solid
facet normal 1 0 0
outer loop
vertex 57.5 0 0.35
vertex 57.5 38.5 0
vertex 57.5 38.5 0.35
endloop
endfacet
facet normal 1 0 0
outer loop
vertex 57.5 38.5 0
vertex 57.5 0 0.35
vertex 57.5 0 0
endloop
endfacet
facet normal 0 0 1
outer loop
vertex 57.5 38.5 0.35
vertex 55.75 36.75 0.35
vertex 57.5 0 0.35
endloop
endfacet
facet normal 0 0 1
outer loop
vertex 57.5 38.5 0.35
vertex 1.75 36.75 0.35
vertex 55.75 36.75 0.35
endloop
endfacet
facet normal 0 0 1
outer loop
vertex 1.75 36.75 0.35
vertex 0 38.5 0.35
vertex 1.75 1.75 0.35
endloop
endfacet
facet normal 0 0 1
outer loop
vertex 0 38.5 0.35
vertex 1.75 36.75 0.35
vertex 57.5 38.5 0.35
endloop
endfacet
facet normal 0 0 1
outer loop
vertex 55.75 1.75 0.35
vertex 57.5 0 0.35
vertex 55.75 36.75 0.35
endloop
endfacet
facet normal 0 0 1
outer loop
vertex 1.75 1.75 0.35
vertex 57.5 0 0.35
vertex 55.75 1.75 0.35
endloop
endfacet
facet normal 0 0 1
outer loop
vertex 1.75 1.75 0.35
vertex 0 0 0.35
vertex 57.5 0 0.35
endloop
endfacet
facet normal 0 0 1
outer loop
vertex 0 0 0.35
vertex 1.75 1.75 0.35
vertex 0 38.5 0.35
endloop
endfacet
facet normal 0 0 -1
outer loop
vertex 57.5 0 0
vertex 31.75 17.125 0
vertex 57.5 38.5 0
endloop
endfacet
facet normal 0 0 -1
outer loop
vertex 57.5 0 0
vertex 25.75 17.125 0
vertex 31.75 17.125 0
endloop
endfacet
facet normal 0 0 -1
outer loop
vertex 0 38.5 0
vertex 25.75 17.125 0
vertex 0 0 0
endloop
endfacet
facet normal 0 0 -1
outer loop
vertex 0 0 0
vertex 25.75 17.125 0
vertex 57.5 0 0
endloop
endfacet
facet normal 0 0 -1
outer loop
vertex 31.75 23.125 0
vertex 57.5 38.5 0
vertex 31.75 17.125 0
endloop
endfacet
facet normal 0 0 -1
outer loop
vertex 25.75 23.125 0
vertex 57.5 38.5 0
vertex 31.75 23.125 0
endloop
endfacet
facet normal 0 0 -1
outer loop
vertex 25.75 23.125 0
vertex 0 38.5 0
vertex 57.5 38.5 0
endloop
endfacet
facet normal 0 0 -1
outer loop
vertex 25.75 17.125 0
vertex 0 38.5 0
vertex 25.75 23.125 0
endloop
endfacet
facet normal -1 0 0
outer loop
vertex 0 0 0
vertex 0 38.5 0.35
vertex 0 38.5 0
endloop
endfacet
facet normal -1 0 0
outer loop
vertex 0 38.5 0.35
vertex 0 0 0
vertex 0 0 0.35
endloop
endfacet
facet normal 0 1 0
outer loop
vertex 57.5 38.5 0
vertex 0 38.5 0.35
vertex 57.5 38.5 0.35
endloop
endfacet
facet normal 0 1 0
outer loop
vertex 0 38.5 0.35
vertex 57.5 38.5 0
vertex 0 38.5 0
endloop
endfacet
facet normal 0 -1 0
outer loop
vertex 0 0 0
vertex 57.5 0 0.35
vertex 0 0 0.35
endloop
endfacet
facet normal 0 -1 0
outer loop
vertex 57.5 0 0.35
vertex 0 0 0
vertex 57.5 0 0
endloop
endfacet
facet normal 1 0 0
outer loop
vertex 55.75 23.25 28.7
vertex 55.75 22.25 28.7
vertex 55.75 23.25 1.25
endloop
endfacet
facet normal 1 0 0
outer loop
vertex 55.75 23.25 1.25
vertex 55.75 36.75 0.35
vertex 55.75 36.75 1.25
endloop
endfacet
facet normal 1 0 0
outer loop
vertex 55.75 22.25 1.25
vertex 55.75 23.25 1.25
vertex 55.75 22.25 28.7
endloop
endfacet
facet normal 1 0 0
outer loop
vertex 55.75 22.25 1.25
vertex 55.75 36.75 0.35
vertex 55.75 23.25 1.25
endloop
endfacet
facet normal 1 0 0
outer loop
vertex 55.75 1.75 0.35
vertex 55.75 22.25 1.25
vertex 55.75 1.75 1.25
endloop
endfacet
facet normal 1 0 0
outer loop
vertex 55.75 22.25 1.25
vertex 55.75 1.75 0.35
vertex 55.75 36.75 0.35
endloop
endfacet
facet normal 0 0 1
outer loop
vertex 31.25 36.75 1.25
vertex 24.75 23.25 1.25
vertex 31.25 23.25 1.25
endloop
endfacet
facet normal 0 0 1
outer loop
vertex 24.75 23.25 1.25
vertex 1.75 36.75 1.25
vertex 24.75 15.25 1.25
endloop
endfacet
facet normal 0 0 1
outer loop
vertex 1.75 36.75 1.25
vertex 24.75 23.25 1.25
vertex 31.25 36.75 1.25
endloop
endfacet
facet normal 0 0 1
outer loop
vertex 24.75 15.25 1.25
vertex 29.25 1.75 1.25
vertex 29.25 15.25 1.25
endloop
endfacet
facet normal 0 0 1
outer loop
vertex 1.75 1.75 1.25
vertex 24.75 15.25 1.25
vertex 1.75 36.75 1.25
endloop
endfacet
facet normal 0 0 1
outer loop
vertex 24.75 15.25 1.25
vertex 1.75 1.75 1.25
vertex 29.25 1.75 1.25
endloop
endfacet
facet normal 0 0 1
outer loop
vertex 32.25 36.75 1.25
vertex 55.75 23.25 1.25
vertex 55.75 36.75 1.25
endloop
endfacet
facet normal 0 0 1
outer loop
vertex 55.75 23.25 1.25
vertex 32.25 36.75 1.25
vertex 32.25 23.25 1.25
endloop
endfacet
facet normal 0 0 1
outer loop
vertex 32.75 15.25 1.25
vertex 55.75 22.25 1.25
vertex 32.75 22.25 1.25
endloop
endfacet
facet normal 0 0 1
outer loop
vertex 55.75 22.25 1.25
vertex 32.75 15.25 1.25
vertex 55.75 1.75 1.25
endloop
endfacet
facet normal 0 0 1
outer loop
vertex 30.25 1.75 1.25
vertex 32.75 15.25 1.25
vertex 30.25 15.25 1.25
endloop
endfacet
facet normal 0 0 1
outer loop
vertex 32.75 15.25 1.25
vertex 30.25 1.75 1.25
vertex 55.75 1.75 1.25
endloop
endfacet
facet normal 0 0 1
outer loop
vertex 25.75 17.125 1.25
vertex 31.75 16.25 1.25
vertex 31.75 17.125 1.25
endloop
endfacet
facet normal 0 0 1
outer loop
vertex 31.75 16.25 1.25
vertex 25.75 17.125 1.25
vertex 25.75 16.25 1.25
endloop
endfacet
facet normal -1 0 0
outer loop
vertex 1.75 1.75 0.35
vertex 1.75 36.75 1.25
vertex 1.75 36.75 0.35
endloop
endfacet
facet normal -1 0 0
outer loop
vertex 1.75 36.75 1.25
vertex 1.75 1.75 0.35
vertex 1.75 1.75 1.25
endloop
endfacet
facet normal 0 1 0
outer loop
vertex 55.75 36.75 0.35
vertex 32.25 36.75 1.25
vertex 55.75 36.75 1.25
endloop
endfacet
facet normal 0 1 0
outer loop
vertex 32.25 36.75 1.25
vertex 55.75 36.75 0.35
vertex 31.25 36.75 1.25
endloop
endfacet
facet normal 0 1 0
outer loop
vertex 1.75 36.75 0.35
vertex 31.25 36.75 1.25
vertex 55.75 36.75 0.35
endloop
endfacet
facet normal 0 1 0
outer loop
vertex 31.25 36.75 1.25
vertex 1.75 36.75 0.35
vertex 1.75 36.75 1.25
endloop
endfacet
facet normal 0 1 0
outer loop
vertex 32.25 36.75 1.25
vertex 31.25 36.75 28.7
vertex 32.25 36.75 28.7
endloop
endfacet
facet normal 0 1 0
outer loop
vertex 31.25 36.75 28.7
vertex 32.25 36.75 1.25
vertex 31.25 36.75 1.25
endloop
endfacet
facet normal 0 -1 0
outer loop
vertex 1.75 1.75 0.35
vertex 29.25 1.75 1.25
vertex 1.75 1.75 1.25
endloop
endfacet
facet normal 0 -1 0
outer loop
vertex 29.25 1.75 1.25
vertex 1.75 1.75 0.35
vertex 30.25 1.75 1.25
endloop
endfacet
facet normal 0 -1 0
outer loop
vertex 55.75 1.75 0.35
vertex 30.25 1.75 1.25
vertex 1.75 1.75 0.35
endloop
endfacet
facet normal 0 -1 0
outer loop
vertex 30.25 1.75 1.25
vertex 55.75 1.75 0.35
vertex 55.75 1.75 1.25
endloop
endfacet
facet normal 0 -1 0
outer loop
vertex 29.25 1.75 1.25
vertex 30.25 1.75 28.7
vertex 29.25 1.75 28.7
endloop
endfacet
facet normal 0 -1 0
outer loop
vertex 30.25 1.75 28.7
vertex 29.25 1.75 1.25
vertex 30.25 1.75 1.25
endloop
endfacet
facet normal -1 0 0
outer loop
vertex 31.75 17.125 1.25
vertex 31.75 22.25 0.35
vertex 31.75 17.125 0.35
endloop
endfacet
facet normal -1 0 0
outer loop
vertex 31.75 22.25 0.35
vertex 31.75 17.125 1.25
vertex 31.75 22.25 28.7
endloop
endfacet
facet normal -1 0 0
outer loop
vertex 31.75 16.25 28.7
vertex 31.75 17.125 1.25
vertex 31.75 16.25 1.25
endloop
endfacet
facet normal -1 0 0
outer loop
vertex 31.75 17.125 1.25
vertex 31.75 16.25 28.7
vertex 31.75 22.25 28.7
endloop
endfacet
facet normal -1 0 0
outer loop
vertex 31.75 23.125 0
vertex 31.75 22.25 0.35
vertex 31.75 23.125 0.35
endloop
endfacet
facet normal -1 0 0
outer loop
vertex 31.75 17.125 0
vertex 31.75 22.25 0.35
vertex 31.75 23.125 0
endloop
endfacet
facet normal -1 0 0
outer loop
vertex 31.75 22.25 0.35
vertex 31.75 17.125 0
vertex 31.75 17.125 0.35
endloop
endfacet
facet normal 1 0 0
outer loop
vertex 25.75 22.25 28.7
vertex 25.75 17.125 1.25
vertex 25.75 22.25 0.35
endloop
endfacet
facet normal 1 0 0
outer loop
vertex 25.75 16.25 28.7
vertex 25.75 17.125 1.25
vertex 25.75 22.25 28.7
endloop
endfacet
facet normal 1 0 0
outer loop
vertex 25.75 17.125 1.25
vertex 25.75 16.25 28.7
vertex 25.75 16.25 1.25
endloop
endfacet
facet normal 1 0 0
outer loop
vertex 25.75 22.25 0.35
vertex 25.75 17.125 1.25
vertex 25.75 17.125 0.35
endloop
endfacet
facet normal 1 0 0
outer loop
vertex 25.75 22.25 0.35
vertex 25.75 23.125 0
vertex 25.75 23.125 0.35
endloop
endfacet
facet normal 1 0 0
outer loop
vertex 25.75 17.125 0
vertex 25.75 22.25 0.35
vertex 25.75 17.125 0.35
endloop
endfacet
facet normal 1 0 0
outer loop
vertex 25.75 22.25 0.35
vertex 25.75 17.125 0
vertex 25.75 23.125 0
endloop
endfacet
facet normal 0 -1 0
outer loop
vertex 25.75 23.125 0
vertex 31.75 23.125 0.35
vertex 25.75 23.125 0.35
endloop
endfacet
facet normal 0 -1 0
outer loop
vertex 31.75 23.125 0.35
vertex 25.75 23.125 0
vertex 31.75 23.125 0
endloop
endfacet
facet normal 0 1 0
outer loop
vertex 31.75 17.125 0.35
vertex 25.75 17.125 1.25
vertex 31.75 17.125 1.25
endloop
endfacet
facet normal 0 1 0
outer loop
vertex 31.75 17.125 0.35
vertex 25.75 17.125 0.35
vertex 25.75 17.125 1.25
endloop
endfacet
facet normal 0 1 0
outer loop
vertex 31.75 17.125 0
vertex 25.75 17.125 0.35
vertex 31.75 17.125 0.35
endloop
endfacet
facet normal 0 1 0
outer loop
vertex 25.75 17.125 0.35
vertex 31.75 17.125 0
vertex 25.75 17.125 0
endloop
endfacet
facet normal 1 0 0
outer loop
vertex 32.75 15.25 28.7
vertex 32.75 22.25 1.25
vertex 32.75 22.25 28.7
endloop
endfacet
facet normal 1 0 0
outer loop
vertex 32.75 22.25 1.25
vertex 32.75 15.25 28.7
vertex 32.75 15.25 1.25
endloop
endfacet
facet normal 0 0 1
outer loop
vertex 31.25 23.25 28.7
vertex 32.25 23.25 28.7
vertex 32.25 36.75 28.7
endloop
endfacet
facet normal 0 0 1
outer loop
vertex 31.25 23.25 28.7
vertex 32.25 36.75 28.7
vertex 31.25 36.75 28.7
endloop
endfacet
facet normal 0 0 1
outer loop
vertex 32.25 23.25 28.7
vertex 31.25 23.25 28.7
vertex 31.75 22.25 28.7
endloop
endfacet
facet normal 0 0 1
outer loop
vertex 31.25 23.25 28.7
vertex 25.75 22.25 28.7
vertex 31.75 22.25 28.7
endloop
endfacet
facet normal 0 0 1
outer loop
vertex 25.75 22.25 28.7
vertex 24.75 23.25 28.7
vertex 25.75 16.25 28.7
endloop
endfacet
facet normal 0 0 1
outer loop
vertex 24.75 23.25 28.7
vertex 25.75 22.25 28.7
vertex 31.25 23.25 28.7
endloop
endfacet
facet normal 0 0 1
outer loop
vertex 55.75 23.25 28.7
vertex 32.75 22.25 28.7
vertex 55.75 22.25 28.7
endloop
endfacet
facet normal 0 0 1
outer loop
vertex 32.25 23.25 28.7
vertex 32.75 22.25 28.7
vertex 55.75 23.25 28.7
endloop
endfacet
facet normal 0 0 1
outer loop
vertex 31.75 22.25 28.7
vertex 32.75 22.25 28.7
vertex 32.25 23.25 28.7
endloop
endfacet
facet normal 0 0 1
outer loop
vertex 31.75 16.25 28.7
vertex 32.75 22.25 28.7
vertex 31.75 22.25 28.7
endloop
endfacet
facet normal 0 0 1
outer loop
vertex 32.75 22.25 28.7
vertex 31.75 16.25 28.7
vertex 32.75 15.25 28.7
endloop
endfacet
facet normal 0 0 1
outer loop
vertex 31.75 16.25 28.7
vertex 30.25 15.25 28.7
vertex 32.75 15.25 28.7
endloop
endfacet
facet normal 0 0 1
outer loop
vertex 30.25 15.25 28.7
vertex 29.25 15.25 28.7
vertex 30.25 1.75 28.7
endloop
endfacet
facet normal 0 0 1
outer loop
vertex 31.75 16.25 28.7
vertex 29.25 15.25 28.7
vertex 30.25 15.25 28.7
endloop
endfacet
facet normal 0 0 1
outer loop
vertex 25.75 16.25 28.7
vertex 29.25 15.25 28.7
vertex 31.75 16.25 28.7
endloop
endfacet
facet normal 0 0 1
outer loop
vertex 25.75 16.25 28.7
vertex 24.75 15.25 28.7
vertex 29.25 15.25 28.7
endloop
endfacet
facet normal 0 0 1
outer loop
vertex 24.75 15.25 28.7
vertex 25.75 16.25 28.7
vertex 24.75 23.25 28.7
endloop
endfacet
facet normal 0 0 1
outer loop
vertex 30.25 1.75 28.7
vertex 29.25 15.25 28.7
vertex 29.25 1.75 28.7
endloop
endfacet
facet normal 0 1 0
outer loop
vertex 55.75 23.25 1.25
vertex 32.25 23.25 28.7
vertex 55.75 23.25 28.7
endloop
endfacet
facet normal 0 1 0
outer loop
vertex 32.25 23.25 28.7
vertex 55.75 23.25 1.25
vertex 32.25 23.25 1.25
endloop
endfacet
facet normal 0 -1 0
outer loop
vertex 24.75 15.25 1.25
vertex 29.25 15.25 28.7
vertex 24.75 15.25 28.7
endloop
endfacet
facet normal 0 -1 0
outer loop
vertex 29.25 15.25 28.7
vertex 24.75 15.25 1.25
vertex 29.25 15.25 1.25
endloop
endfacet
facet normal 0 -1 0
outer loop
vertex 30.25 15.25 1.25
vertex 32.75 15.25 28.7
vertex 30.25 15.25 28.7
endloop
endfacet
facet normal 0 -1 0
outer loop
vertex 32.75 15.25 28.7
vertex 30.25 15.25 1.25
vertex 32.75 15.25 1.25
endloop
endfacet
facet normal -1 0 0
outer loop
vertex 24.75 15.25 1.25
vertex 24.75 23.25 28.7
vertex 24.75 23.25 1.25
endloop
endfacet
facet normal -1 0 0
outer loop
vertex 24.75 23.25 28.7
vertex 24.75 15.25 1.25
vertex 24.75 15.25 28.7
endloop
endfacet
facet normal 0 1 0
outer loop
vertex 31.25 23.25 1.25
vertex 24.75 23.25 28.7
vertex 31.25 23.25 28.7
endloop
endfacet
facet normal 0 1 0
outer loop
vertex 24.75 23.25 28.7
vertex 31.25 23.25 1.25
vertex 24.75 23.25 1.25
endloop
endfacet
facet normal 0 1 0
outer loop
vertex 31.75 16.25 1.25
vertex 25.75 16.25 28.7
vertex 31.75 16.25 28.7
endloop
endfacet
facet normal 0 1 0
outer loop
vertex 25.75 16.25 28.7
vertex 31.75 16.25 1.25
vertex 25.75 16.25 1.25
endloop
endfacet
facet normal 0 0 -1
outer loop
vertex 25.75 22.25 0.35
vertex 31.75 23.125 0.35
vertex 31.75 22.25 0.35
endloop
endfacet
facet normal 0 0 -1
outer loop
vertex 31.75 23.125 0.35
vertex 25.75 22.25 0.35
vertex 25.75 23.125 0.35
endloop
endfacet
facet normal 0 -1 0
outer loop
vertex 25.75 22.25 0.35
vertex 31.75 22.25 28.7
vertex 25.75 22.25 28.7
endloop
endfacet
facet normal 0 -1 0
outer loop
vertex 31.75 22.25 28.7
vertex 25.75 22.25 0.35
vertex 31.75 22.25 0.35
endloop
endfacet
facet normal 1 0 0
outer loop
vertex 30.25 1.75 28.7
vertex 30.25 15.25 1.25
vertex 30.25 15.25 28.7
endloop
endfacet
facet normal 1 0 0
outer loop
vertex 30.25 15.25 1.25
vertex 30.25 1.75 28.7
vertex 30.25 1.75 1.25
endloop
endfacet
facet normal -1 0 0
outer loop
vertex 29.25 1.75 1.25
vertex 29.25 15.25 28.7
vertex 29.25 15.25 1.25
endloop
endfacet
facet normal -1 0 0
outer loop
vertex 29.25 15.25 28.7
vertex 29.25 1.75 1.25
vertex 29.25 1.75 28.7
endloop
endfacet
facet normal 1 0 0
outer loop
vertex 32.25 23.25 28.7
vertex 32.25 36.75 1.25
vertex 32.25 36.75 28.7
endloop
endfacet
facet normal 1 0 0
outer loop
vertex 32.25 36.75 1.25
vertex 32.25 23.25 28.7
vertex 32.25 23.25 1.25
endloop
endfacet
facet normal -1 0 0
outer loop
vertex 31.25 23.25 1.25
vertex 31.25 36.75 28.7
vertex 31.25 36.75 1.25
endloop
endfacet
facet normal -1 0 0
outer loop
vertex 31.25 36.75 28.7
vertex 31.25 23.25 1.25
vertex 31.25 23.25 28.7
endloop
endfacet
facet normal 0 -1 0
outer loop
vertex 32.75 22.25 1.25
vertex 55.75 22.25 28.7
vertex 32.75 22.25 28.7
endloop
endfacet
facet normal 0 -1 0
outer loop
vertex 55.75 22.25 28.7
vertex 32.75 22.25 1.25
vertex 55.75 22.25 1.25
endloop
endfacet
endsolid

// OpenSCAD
/*
Projekt Name: Trennwaende für das Modellhaus 3723
Modul:  Grundplatte und Waende für das Erdgeschoss
Projekt URL: https://github.com/Hardi-St/MobaLedLib_Docu/tree/master/3D_Daten_fuer_die_MobaLedLib/Trennwände%20für%20Häuser
Version: 0.0.1
Autor: Moba-Nick (mobanick@wp12085804.server-he.de)
Lizenz: CC-BY-SA-4.0 (https://creativecommons.org/licenses/by-sa/4.0/legalcode.de)
*/
// Alle Angaben sind immer in mm bei meinen Projekten.
//Parameter für die Grundplatte des Hauses
x_grund = 54;       // Laenge der Grundplatte
y_grund = 35;       // Breite der Grundplatte 
z_grund = 1.25;       // Staerke der Grundplatte
z_erdgeschoss = 28; // Hoehe des Erdgeschosses - 6 mm für die Zwischendecke

// Parameter für die Staerke der Waende
wand_staerke = 1.0;
/*
    Um zu verhindern das die GrundPlatte_Haus in das Haus ruscht, bekommt diese einen Rand der breiter und laenger ist als die Oeffnung. Nachfolgend werden die Werte für die Staerke und dem zusaetzlichen Rand definiert.
*/
z_rand = 0.35;  //Staerke des Zusatzrandes
rand = 1.75;    // Breite des umlaufenden Rands

/*
    Bitte die drei Formeln nicht aendern. Diese errechnen die zusätzlichen Parameter aus den vorhandenen Weten der Zeilen 10 - 22.
*/
x_all = x_grund + rand*2;
y_all = y_grund + rand*2;
z_all = z_grund + z_rand;

/* 
    Wenn die GrundPlatte_Haus eine Halterung für eine Lampe hat oder ein Kabelschacht eine Oeffnung braucht, kann man hier einen Ausschnitt in der GrundPlatte_Haus dafuer vorsehen und die Position und Groesse angeben.
*/
x_cut = 6;  // Laenge der Aussparung
y_cut = 6;  // Breite der Aussparung
cut_pos_x = x_grund/2 - x_cut/2 + rand; // Punkt X der Aussparung
cut_pos_y = y_all/2 - y_cut/2+rand/2; // Punkt Y der Aussparung 


/*
    Im nachfolgendem Abschnitt wird die Grundplatte und alle Waende erstellt.
    Die Angaben koennen ganz nach belieben abgeaendert werden.
*/
//Erstellen der Grundplatte mit dem Rand, sowie dem Loch für den Kabelschacht (true = mit loch, false = ohne Loch)
GrundPlatte_Haus(true); 

// Waende für Kabelschacht
// rechts
Wand_DIR_X(x_grund/2+x_cut/2+wand_staerke/2,y_grund/2-y_cut/2-wand_staerke,x_cut+wand_staerke*2);
//links
Wand_DIR_X(x_grund/2-x_cut/2-wand_staerke/2,y_grund/2-y_cut/2-wand_staerke,x_cut+wand_staerke*2);
//unten
Wand_DIR_Y(x_grund/2-x_cut/2,y_grund/2-y_cut/2-wand_staerke/2,y_cut);
//oben
Wand_DIR_Y(x_grund/2-x_cut/2,y_grund/2+y_cut/2+wand_staerke/2,y_cut);
    
// Wand vorne bis Mitte
Wand_DIR_X(x_grund/2+wand_staerke, 0,y_grund/2-y_cut/2); 

// Wand Mitte bis Hinten
Wand_DIR_X(x_grund/2+3, y_grund/2+y_cut/2,y_grund/2-y_cut/2);

// Wand Mitte bis Rechts
Wand_DIR_Y(x_grund/2+x_cut/2+wand_staerke,y_grund/2+y_cut/2+wand_staerke/2,x_grund/2-x_cut/2-wand_staerke);





//Die dritte Wand geht von der linken Aussenseite bis zur zweiten Wand
//Wand_DIR_Y(0,11.25+wand_staerke/2,40.25);

//Die vierte und letzte Wand. Diese geht von der oberen Kante zu der dritten Wand. Dadurch ist nun auch der Kabelschacht sichtbar.
//Wand_DIR_X(29.25,y_grund - (25.25+1.5+12+1.5),37.75+wand_staerke*2);



/* 
!!!!!!!!!!!!!!!!!!!!!!!!!!!!!!!!!!!!!!!!!!!!!!!!!!!!!!!!!!!!!!!!!!!!   
!!!!    Ab hier kommen die Module. Bitte nur aendern wann man   !!!!
!!!!    weiss was man macht.                                    !!!!
!!!!!!!!!!!!!!!!!!!!!!!!!!!!!!!!!!!!!!!!!!!!!!!!!!!!!!!!!!!!!!!!!!!!
/*  
    Das Module GrundPlatte_Haus erstellt die Grundplatte des Hauses inkl. des Aussenrandes um die Grundplatte. Dazu wurde im Bereich für die Parameter in den  Zeilen 10 - 37 die Werte angeben.
*/
module GrundPlatte_Haus(cutting){
        difference(){
            union(){
                cube([x_all,y_all,z_rand],false);
                translate([rand,rand,0]){
                    cube([x_grund,y_grund,z_grund],false);
                }
            }
            // Auschnitt aus der Grundplatte vornehmen
            if (cutting == true){
                translate([cut_pos_x,cut_pos_y,0]){
                    cube([x_cut,y_cut,z_all],false);
                }
            }
        }
}

/*
    Das Modul "Wand_DIR_X" erstellt Waende welche auf der X-Achse (von links nach rechts) verschoben werden koennen.
    Die Hoehe ist dabei immer die gesamte Hoehe des Stockwerkes.
    pos_x   => gibt den Startpunkt auf der X-Achse an.
    pos_y   => gibt den Startpunkt auf der Y-Achse an.
    width_x => gibt an wie lang die Wand werden soll.
    Der Rand um die Grundplatte wird automatisch mit eingerechnet in die Startpositionen.
*/
module Wand_DIR_X(pos_x, pos_y, width_x){
    translate([pos_x + rand -wand_staerke/2,pos_y + rand,z_rand]){
        cube([wand_staerke,width_x, z_erdgeschoss+z_rand]);
    }
}

/*
    Das Modul "Wand_DIR_Y" erstellt Waende welche auf der Y-Achse (von vorne nach hinten) verschoben werden koennen.  
    Die Hoehe ist dabei immer die gesamte Hoehe des Stockwerkes.
    pos_x   => gibt den Startpunkt auf der X-Achse an.
    pos_y   => gibt den Startpunkt auf der Y-Achse an.
    width_y => gibt an wie lang die Wand werden soll.
    Der Rand um die Grundplatte wird automatisch mit eingerechnet in die Startpositionen.
*/
module Wand_DIR_Y(pos_x, pos_y, width_y){
    translate([pos_x + rand,pos_y + rand -wand_staerke/2,z_rand]){
        cube([width_y,wand_staerke, z_erdgeschoss+z_rand]);
    }
}
